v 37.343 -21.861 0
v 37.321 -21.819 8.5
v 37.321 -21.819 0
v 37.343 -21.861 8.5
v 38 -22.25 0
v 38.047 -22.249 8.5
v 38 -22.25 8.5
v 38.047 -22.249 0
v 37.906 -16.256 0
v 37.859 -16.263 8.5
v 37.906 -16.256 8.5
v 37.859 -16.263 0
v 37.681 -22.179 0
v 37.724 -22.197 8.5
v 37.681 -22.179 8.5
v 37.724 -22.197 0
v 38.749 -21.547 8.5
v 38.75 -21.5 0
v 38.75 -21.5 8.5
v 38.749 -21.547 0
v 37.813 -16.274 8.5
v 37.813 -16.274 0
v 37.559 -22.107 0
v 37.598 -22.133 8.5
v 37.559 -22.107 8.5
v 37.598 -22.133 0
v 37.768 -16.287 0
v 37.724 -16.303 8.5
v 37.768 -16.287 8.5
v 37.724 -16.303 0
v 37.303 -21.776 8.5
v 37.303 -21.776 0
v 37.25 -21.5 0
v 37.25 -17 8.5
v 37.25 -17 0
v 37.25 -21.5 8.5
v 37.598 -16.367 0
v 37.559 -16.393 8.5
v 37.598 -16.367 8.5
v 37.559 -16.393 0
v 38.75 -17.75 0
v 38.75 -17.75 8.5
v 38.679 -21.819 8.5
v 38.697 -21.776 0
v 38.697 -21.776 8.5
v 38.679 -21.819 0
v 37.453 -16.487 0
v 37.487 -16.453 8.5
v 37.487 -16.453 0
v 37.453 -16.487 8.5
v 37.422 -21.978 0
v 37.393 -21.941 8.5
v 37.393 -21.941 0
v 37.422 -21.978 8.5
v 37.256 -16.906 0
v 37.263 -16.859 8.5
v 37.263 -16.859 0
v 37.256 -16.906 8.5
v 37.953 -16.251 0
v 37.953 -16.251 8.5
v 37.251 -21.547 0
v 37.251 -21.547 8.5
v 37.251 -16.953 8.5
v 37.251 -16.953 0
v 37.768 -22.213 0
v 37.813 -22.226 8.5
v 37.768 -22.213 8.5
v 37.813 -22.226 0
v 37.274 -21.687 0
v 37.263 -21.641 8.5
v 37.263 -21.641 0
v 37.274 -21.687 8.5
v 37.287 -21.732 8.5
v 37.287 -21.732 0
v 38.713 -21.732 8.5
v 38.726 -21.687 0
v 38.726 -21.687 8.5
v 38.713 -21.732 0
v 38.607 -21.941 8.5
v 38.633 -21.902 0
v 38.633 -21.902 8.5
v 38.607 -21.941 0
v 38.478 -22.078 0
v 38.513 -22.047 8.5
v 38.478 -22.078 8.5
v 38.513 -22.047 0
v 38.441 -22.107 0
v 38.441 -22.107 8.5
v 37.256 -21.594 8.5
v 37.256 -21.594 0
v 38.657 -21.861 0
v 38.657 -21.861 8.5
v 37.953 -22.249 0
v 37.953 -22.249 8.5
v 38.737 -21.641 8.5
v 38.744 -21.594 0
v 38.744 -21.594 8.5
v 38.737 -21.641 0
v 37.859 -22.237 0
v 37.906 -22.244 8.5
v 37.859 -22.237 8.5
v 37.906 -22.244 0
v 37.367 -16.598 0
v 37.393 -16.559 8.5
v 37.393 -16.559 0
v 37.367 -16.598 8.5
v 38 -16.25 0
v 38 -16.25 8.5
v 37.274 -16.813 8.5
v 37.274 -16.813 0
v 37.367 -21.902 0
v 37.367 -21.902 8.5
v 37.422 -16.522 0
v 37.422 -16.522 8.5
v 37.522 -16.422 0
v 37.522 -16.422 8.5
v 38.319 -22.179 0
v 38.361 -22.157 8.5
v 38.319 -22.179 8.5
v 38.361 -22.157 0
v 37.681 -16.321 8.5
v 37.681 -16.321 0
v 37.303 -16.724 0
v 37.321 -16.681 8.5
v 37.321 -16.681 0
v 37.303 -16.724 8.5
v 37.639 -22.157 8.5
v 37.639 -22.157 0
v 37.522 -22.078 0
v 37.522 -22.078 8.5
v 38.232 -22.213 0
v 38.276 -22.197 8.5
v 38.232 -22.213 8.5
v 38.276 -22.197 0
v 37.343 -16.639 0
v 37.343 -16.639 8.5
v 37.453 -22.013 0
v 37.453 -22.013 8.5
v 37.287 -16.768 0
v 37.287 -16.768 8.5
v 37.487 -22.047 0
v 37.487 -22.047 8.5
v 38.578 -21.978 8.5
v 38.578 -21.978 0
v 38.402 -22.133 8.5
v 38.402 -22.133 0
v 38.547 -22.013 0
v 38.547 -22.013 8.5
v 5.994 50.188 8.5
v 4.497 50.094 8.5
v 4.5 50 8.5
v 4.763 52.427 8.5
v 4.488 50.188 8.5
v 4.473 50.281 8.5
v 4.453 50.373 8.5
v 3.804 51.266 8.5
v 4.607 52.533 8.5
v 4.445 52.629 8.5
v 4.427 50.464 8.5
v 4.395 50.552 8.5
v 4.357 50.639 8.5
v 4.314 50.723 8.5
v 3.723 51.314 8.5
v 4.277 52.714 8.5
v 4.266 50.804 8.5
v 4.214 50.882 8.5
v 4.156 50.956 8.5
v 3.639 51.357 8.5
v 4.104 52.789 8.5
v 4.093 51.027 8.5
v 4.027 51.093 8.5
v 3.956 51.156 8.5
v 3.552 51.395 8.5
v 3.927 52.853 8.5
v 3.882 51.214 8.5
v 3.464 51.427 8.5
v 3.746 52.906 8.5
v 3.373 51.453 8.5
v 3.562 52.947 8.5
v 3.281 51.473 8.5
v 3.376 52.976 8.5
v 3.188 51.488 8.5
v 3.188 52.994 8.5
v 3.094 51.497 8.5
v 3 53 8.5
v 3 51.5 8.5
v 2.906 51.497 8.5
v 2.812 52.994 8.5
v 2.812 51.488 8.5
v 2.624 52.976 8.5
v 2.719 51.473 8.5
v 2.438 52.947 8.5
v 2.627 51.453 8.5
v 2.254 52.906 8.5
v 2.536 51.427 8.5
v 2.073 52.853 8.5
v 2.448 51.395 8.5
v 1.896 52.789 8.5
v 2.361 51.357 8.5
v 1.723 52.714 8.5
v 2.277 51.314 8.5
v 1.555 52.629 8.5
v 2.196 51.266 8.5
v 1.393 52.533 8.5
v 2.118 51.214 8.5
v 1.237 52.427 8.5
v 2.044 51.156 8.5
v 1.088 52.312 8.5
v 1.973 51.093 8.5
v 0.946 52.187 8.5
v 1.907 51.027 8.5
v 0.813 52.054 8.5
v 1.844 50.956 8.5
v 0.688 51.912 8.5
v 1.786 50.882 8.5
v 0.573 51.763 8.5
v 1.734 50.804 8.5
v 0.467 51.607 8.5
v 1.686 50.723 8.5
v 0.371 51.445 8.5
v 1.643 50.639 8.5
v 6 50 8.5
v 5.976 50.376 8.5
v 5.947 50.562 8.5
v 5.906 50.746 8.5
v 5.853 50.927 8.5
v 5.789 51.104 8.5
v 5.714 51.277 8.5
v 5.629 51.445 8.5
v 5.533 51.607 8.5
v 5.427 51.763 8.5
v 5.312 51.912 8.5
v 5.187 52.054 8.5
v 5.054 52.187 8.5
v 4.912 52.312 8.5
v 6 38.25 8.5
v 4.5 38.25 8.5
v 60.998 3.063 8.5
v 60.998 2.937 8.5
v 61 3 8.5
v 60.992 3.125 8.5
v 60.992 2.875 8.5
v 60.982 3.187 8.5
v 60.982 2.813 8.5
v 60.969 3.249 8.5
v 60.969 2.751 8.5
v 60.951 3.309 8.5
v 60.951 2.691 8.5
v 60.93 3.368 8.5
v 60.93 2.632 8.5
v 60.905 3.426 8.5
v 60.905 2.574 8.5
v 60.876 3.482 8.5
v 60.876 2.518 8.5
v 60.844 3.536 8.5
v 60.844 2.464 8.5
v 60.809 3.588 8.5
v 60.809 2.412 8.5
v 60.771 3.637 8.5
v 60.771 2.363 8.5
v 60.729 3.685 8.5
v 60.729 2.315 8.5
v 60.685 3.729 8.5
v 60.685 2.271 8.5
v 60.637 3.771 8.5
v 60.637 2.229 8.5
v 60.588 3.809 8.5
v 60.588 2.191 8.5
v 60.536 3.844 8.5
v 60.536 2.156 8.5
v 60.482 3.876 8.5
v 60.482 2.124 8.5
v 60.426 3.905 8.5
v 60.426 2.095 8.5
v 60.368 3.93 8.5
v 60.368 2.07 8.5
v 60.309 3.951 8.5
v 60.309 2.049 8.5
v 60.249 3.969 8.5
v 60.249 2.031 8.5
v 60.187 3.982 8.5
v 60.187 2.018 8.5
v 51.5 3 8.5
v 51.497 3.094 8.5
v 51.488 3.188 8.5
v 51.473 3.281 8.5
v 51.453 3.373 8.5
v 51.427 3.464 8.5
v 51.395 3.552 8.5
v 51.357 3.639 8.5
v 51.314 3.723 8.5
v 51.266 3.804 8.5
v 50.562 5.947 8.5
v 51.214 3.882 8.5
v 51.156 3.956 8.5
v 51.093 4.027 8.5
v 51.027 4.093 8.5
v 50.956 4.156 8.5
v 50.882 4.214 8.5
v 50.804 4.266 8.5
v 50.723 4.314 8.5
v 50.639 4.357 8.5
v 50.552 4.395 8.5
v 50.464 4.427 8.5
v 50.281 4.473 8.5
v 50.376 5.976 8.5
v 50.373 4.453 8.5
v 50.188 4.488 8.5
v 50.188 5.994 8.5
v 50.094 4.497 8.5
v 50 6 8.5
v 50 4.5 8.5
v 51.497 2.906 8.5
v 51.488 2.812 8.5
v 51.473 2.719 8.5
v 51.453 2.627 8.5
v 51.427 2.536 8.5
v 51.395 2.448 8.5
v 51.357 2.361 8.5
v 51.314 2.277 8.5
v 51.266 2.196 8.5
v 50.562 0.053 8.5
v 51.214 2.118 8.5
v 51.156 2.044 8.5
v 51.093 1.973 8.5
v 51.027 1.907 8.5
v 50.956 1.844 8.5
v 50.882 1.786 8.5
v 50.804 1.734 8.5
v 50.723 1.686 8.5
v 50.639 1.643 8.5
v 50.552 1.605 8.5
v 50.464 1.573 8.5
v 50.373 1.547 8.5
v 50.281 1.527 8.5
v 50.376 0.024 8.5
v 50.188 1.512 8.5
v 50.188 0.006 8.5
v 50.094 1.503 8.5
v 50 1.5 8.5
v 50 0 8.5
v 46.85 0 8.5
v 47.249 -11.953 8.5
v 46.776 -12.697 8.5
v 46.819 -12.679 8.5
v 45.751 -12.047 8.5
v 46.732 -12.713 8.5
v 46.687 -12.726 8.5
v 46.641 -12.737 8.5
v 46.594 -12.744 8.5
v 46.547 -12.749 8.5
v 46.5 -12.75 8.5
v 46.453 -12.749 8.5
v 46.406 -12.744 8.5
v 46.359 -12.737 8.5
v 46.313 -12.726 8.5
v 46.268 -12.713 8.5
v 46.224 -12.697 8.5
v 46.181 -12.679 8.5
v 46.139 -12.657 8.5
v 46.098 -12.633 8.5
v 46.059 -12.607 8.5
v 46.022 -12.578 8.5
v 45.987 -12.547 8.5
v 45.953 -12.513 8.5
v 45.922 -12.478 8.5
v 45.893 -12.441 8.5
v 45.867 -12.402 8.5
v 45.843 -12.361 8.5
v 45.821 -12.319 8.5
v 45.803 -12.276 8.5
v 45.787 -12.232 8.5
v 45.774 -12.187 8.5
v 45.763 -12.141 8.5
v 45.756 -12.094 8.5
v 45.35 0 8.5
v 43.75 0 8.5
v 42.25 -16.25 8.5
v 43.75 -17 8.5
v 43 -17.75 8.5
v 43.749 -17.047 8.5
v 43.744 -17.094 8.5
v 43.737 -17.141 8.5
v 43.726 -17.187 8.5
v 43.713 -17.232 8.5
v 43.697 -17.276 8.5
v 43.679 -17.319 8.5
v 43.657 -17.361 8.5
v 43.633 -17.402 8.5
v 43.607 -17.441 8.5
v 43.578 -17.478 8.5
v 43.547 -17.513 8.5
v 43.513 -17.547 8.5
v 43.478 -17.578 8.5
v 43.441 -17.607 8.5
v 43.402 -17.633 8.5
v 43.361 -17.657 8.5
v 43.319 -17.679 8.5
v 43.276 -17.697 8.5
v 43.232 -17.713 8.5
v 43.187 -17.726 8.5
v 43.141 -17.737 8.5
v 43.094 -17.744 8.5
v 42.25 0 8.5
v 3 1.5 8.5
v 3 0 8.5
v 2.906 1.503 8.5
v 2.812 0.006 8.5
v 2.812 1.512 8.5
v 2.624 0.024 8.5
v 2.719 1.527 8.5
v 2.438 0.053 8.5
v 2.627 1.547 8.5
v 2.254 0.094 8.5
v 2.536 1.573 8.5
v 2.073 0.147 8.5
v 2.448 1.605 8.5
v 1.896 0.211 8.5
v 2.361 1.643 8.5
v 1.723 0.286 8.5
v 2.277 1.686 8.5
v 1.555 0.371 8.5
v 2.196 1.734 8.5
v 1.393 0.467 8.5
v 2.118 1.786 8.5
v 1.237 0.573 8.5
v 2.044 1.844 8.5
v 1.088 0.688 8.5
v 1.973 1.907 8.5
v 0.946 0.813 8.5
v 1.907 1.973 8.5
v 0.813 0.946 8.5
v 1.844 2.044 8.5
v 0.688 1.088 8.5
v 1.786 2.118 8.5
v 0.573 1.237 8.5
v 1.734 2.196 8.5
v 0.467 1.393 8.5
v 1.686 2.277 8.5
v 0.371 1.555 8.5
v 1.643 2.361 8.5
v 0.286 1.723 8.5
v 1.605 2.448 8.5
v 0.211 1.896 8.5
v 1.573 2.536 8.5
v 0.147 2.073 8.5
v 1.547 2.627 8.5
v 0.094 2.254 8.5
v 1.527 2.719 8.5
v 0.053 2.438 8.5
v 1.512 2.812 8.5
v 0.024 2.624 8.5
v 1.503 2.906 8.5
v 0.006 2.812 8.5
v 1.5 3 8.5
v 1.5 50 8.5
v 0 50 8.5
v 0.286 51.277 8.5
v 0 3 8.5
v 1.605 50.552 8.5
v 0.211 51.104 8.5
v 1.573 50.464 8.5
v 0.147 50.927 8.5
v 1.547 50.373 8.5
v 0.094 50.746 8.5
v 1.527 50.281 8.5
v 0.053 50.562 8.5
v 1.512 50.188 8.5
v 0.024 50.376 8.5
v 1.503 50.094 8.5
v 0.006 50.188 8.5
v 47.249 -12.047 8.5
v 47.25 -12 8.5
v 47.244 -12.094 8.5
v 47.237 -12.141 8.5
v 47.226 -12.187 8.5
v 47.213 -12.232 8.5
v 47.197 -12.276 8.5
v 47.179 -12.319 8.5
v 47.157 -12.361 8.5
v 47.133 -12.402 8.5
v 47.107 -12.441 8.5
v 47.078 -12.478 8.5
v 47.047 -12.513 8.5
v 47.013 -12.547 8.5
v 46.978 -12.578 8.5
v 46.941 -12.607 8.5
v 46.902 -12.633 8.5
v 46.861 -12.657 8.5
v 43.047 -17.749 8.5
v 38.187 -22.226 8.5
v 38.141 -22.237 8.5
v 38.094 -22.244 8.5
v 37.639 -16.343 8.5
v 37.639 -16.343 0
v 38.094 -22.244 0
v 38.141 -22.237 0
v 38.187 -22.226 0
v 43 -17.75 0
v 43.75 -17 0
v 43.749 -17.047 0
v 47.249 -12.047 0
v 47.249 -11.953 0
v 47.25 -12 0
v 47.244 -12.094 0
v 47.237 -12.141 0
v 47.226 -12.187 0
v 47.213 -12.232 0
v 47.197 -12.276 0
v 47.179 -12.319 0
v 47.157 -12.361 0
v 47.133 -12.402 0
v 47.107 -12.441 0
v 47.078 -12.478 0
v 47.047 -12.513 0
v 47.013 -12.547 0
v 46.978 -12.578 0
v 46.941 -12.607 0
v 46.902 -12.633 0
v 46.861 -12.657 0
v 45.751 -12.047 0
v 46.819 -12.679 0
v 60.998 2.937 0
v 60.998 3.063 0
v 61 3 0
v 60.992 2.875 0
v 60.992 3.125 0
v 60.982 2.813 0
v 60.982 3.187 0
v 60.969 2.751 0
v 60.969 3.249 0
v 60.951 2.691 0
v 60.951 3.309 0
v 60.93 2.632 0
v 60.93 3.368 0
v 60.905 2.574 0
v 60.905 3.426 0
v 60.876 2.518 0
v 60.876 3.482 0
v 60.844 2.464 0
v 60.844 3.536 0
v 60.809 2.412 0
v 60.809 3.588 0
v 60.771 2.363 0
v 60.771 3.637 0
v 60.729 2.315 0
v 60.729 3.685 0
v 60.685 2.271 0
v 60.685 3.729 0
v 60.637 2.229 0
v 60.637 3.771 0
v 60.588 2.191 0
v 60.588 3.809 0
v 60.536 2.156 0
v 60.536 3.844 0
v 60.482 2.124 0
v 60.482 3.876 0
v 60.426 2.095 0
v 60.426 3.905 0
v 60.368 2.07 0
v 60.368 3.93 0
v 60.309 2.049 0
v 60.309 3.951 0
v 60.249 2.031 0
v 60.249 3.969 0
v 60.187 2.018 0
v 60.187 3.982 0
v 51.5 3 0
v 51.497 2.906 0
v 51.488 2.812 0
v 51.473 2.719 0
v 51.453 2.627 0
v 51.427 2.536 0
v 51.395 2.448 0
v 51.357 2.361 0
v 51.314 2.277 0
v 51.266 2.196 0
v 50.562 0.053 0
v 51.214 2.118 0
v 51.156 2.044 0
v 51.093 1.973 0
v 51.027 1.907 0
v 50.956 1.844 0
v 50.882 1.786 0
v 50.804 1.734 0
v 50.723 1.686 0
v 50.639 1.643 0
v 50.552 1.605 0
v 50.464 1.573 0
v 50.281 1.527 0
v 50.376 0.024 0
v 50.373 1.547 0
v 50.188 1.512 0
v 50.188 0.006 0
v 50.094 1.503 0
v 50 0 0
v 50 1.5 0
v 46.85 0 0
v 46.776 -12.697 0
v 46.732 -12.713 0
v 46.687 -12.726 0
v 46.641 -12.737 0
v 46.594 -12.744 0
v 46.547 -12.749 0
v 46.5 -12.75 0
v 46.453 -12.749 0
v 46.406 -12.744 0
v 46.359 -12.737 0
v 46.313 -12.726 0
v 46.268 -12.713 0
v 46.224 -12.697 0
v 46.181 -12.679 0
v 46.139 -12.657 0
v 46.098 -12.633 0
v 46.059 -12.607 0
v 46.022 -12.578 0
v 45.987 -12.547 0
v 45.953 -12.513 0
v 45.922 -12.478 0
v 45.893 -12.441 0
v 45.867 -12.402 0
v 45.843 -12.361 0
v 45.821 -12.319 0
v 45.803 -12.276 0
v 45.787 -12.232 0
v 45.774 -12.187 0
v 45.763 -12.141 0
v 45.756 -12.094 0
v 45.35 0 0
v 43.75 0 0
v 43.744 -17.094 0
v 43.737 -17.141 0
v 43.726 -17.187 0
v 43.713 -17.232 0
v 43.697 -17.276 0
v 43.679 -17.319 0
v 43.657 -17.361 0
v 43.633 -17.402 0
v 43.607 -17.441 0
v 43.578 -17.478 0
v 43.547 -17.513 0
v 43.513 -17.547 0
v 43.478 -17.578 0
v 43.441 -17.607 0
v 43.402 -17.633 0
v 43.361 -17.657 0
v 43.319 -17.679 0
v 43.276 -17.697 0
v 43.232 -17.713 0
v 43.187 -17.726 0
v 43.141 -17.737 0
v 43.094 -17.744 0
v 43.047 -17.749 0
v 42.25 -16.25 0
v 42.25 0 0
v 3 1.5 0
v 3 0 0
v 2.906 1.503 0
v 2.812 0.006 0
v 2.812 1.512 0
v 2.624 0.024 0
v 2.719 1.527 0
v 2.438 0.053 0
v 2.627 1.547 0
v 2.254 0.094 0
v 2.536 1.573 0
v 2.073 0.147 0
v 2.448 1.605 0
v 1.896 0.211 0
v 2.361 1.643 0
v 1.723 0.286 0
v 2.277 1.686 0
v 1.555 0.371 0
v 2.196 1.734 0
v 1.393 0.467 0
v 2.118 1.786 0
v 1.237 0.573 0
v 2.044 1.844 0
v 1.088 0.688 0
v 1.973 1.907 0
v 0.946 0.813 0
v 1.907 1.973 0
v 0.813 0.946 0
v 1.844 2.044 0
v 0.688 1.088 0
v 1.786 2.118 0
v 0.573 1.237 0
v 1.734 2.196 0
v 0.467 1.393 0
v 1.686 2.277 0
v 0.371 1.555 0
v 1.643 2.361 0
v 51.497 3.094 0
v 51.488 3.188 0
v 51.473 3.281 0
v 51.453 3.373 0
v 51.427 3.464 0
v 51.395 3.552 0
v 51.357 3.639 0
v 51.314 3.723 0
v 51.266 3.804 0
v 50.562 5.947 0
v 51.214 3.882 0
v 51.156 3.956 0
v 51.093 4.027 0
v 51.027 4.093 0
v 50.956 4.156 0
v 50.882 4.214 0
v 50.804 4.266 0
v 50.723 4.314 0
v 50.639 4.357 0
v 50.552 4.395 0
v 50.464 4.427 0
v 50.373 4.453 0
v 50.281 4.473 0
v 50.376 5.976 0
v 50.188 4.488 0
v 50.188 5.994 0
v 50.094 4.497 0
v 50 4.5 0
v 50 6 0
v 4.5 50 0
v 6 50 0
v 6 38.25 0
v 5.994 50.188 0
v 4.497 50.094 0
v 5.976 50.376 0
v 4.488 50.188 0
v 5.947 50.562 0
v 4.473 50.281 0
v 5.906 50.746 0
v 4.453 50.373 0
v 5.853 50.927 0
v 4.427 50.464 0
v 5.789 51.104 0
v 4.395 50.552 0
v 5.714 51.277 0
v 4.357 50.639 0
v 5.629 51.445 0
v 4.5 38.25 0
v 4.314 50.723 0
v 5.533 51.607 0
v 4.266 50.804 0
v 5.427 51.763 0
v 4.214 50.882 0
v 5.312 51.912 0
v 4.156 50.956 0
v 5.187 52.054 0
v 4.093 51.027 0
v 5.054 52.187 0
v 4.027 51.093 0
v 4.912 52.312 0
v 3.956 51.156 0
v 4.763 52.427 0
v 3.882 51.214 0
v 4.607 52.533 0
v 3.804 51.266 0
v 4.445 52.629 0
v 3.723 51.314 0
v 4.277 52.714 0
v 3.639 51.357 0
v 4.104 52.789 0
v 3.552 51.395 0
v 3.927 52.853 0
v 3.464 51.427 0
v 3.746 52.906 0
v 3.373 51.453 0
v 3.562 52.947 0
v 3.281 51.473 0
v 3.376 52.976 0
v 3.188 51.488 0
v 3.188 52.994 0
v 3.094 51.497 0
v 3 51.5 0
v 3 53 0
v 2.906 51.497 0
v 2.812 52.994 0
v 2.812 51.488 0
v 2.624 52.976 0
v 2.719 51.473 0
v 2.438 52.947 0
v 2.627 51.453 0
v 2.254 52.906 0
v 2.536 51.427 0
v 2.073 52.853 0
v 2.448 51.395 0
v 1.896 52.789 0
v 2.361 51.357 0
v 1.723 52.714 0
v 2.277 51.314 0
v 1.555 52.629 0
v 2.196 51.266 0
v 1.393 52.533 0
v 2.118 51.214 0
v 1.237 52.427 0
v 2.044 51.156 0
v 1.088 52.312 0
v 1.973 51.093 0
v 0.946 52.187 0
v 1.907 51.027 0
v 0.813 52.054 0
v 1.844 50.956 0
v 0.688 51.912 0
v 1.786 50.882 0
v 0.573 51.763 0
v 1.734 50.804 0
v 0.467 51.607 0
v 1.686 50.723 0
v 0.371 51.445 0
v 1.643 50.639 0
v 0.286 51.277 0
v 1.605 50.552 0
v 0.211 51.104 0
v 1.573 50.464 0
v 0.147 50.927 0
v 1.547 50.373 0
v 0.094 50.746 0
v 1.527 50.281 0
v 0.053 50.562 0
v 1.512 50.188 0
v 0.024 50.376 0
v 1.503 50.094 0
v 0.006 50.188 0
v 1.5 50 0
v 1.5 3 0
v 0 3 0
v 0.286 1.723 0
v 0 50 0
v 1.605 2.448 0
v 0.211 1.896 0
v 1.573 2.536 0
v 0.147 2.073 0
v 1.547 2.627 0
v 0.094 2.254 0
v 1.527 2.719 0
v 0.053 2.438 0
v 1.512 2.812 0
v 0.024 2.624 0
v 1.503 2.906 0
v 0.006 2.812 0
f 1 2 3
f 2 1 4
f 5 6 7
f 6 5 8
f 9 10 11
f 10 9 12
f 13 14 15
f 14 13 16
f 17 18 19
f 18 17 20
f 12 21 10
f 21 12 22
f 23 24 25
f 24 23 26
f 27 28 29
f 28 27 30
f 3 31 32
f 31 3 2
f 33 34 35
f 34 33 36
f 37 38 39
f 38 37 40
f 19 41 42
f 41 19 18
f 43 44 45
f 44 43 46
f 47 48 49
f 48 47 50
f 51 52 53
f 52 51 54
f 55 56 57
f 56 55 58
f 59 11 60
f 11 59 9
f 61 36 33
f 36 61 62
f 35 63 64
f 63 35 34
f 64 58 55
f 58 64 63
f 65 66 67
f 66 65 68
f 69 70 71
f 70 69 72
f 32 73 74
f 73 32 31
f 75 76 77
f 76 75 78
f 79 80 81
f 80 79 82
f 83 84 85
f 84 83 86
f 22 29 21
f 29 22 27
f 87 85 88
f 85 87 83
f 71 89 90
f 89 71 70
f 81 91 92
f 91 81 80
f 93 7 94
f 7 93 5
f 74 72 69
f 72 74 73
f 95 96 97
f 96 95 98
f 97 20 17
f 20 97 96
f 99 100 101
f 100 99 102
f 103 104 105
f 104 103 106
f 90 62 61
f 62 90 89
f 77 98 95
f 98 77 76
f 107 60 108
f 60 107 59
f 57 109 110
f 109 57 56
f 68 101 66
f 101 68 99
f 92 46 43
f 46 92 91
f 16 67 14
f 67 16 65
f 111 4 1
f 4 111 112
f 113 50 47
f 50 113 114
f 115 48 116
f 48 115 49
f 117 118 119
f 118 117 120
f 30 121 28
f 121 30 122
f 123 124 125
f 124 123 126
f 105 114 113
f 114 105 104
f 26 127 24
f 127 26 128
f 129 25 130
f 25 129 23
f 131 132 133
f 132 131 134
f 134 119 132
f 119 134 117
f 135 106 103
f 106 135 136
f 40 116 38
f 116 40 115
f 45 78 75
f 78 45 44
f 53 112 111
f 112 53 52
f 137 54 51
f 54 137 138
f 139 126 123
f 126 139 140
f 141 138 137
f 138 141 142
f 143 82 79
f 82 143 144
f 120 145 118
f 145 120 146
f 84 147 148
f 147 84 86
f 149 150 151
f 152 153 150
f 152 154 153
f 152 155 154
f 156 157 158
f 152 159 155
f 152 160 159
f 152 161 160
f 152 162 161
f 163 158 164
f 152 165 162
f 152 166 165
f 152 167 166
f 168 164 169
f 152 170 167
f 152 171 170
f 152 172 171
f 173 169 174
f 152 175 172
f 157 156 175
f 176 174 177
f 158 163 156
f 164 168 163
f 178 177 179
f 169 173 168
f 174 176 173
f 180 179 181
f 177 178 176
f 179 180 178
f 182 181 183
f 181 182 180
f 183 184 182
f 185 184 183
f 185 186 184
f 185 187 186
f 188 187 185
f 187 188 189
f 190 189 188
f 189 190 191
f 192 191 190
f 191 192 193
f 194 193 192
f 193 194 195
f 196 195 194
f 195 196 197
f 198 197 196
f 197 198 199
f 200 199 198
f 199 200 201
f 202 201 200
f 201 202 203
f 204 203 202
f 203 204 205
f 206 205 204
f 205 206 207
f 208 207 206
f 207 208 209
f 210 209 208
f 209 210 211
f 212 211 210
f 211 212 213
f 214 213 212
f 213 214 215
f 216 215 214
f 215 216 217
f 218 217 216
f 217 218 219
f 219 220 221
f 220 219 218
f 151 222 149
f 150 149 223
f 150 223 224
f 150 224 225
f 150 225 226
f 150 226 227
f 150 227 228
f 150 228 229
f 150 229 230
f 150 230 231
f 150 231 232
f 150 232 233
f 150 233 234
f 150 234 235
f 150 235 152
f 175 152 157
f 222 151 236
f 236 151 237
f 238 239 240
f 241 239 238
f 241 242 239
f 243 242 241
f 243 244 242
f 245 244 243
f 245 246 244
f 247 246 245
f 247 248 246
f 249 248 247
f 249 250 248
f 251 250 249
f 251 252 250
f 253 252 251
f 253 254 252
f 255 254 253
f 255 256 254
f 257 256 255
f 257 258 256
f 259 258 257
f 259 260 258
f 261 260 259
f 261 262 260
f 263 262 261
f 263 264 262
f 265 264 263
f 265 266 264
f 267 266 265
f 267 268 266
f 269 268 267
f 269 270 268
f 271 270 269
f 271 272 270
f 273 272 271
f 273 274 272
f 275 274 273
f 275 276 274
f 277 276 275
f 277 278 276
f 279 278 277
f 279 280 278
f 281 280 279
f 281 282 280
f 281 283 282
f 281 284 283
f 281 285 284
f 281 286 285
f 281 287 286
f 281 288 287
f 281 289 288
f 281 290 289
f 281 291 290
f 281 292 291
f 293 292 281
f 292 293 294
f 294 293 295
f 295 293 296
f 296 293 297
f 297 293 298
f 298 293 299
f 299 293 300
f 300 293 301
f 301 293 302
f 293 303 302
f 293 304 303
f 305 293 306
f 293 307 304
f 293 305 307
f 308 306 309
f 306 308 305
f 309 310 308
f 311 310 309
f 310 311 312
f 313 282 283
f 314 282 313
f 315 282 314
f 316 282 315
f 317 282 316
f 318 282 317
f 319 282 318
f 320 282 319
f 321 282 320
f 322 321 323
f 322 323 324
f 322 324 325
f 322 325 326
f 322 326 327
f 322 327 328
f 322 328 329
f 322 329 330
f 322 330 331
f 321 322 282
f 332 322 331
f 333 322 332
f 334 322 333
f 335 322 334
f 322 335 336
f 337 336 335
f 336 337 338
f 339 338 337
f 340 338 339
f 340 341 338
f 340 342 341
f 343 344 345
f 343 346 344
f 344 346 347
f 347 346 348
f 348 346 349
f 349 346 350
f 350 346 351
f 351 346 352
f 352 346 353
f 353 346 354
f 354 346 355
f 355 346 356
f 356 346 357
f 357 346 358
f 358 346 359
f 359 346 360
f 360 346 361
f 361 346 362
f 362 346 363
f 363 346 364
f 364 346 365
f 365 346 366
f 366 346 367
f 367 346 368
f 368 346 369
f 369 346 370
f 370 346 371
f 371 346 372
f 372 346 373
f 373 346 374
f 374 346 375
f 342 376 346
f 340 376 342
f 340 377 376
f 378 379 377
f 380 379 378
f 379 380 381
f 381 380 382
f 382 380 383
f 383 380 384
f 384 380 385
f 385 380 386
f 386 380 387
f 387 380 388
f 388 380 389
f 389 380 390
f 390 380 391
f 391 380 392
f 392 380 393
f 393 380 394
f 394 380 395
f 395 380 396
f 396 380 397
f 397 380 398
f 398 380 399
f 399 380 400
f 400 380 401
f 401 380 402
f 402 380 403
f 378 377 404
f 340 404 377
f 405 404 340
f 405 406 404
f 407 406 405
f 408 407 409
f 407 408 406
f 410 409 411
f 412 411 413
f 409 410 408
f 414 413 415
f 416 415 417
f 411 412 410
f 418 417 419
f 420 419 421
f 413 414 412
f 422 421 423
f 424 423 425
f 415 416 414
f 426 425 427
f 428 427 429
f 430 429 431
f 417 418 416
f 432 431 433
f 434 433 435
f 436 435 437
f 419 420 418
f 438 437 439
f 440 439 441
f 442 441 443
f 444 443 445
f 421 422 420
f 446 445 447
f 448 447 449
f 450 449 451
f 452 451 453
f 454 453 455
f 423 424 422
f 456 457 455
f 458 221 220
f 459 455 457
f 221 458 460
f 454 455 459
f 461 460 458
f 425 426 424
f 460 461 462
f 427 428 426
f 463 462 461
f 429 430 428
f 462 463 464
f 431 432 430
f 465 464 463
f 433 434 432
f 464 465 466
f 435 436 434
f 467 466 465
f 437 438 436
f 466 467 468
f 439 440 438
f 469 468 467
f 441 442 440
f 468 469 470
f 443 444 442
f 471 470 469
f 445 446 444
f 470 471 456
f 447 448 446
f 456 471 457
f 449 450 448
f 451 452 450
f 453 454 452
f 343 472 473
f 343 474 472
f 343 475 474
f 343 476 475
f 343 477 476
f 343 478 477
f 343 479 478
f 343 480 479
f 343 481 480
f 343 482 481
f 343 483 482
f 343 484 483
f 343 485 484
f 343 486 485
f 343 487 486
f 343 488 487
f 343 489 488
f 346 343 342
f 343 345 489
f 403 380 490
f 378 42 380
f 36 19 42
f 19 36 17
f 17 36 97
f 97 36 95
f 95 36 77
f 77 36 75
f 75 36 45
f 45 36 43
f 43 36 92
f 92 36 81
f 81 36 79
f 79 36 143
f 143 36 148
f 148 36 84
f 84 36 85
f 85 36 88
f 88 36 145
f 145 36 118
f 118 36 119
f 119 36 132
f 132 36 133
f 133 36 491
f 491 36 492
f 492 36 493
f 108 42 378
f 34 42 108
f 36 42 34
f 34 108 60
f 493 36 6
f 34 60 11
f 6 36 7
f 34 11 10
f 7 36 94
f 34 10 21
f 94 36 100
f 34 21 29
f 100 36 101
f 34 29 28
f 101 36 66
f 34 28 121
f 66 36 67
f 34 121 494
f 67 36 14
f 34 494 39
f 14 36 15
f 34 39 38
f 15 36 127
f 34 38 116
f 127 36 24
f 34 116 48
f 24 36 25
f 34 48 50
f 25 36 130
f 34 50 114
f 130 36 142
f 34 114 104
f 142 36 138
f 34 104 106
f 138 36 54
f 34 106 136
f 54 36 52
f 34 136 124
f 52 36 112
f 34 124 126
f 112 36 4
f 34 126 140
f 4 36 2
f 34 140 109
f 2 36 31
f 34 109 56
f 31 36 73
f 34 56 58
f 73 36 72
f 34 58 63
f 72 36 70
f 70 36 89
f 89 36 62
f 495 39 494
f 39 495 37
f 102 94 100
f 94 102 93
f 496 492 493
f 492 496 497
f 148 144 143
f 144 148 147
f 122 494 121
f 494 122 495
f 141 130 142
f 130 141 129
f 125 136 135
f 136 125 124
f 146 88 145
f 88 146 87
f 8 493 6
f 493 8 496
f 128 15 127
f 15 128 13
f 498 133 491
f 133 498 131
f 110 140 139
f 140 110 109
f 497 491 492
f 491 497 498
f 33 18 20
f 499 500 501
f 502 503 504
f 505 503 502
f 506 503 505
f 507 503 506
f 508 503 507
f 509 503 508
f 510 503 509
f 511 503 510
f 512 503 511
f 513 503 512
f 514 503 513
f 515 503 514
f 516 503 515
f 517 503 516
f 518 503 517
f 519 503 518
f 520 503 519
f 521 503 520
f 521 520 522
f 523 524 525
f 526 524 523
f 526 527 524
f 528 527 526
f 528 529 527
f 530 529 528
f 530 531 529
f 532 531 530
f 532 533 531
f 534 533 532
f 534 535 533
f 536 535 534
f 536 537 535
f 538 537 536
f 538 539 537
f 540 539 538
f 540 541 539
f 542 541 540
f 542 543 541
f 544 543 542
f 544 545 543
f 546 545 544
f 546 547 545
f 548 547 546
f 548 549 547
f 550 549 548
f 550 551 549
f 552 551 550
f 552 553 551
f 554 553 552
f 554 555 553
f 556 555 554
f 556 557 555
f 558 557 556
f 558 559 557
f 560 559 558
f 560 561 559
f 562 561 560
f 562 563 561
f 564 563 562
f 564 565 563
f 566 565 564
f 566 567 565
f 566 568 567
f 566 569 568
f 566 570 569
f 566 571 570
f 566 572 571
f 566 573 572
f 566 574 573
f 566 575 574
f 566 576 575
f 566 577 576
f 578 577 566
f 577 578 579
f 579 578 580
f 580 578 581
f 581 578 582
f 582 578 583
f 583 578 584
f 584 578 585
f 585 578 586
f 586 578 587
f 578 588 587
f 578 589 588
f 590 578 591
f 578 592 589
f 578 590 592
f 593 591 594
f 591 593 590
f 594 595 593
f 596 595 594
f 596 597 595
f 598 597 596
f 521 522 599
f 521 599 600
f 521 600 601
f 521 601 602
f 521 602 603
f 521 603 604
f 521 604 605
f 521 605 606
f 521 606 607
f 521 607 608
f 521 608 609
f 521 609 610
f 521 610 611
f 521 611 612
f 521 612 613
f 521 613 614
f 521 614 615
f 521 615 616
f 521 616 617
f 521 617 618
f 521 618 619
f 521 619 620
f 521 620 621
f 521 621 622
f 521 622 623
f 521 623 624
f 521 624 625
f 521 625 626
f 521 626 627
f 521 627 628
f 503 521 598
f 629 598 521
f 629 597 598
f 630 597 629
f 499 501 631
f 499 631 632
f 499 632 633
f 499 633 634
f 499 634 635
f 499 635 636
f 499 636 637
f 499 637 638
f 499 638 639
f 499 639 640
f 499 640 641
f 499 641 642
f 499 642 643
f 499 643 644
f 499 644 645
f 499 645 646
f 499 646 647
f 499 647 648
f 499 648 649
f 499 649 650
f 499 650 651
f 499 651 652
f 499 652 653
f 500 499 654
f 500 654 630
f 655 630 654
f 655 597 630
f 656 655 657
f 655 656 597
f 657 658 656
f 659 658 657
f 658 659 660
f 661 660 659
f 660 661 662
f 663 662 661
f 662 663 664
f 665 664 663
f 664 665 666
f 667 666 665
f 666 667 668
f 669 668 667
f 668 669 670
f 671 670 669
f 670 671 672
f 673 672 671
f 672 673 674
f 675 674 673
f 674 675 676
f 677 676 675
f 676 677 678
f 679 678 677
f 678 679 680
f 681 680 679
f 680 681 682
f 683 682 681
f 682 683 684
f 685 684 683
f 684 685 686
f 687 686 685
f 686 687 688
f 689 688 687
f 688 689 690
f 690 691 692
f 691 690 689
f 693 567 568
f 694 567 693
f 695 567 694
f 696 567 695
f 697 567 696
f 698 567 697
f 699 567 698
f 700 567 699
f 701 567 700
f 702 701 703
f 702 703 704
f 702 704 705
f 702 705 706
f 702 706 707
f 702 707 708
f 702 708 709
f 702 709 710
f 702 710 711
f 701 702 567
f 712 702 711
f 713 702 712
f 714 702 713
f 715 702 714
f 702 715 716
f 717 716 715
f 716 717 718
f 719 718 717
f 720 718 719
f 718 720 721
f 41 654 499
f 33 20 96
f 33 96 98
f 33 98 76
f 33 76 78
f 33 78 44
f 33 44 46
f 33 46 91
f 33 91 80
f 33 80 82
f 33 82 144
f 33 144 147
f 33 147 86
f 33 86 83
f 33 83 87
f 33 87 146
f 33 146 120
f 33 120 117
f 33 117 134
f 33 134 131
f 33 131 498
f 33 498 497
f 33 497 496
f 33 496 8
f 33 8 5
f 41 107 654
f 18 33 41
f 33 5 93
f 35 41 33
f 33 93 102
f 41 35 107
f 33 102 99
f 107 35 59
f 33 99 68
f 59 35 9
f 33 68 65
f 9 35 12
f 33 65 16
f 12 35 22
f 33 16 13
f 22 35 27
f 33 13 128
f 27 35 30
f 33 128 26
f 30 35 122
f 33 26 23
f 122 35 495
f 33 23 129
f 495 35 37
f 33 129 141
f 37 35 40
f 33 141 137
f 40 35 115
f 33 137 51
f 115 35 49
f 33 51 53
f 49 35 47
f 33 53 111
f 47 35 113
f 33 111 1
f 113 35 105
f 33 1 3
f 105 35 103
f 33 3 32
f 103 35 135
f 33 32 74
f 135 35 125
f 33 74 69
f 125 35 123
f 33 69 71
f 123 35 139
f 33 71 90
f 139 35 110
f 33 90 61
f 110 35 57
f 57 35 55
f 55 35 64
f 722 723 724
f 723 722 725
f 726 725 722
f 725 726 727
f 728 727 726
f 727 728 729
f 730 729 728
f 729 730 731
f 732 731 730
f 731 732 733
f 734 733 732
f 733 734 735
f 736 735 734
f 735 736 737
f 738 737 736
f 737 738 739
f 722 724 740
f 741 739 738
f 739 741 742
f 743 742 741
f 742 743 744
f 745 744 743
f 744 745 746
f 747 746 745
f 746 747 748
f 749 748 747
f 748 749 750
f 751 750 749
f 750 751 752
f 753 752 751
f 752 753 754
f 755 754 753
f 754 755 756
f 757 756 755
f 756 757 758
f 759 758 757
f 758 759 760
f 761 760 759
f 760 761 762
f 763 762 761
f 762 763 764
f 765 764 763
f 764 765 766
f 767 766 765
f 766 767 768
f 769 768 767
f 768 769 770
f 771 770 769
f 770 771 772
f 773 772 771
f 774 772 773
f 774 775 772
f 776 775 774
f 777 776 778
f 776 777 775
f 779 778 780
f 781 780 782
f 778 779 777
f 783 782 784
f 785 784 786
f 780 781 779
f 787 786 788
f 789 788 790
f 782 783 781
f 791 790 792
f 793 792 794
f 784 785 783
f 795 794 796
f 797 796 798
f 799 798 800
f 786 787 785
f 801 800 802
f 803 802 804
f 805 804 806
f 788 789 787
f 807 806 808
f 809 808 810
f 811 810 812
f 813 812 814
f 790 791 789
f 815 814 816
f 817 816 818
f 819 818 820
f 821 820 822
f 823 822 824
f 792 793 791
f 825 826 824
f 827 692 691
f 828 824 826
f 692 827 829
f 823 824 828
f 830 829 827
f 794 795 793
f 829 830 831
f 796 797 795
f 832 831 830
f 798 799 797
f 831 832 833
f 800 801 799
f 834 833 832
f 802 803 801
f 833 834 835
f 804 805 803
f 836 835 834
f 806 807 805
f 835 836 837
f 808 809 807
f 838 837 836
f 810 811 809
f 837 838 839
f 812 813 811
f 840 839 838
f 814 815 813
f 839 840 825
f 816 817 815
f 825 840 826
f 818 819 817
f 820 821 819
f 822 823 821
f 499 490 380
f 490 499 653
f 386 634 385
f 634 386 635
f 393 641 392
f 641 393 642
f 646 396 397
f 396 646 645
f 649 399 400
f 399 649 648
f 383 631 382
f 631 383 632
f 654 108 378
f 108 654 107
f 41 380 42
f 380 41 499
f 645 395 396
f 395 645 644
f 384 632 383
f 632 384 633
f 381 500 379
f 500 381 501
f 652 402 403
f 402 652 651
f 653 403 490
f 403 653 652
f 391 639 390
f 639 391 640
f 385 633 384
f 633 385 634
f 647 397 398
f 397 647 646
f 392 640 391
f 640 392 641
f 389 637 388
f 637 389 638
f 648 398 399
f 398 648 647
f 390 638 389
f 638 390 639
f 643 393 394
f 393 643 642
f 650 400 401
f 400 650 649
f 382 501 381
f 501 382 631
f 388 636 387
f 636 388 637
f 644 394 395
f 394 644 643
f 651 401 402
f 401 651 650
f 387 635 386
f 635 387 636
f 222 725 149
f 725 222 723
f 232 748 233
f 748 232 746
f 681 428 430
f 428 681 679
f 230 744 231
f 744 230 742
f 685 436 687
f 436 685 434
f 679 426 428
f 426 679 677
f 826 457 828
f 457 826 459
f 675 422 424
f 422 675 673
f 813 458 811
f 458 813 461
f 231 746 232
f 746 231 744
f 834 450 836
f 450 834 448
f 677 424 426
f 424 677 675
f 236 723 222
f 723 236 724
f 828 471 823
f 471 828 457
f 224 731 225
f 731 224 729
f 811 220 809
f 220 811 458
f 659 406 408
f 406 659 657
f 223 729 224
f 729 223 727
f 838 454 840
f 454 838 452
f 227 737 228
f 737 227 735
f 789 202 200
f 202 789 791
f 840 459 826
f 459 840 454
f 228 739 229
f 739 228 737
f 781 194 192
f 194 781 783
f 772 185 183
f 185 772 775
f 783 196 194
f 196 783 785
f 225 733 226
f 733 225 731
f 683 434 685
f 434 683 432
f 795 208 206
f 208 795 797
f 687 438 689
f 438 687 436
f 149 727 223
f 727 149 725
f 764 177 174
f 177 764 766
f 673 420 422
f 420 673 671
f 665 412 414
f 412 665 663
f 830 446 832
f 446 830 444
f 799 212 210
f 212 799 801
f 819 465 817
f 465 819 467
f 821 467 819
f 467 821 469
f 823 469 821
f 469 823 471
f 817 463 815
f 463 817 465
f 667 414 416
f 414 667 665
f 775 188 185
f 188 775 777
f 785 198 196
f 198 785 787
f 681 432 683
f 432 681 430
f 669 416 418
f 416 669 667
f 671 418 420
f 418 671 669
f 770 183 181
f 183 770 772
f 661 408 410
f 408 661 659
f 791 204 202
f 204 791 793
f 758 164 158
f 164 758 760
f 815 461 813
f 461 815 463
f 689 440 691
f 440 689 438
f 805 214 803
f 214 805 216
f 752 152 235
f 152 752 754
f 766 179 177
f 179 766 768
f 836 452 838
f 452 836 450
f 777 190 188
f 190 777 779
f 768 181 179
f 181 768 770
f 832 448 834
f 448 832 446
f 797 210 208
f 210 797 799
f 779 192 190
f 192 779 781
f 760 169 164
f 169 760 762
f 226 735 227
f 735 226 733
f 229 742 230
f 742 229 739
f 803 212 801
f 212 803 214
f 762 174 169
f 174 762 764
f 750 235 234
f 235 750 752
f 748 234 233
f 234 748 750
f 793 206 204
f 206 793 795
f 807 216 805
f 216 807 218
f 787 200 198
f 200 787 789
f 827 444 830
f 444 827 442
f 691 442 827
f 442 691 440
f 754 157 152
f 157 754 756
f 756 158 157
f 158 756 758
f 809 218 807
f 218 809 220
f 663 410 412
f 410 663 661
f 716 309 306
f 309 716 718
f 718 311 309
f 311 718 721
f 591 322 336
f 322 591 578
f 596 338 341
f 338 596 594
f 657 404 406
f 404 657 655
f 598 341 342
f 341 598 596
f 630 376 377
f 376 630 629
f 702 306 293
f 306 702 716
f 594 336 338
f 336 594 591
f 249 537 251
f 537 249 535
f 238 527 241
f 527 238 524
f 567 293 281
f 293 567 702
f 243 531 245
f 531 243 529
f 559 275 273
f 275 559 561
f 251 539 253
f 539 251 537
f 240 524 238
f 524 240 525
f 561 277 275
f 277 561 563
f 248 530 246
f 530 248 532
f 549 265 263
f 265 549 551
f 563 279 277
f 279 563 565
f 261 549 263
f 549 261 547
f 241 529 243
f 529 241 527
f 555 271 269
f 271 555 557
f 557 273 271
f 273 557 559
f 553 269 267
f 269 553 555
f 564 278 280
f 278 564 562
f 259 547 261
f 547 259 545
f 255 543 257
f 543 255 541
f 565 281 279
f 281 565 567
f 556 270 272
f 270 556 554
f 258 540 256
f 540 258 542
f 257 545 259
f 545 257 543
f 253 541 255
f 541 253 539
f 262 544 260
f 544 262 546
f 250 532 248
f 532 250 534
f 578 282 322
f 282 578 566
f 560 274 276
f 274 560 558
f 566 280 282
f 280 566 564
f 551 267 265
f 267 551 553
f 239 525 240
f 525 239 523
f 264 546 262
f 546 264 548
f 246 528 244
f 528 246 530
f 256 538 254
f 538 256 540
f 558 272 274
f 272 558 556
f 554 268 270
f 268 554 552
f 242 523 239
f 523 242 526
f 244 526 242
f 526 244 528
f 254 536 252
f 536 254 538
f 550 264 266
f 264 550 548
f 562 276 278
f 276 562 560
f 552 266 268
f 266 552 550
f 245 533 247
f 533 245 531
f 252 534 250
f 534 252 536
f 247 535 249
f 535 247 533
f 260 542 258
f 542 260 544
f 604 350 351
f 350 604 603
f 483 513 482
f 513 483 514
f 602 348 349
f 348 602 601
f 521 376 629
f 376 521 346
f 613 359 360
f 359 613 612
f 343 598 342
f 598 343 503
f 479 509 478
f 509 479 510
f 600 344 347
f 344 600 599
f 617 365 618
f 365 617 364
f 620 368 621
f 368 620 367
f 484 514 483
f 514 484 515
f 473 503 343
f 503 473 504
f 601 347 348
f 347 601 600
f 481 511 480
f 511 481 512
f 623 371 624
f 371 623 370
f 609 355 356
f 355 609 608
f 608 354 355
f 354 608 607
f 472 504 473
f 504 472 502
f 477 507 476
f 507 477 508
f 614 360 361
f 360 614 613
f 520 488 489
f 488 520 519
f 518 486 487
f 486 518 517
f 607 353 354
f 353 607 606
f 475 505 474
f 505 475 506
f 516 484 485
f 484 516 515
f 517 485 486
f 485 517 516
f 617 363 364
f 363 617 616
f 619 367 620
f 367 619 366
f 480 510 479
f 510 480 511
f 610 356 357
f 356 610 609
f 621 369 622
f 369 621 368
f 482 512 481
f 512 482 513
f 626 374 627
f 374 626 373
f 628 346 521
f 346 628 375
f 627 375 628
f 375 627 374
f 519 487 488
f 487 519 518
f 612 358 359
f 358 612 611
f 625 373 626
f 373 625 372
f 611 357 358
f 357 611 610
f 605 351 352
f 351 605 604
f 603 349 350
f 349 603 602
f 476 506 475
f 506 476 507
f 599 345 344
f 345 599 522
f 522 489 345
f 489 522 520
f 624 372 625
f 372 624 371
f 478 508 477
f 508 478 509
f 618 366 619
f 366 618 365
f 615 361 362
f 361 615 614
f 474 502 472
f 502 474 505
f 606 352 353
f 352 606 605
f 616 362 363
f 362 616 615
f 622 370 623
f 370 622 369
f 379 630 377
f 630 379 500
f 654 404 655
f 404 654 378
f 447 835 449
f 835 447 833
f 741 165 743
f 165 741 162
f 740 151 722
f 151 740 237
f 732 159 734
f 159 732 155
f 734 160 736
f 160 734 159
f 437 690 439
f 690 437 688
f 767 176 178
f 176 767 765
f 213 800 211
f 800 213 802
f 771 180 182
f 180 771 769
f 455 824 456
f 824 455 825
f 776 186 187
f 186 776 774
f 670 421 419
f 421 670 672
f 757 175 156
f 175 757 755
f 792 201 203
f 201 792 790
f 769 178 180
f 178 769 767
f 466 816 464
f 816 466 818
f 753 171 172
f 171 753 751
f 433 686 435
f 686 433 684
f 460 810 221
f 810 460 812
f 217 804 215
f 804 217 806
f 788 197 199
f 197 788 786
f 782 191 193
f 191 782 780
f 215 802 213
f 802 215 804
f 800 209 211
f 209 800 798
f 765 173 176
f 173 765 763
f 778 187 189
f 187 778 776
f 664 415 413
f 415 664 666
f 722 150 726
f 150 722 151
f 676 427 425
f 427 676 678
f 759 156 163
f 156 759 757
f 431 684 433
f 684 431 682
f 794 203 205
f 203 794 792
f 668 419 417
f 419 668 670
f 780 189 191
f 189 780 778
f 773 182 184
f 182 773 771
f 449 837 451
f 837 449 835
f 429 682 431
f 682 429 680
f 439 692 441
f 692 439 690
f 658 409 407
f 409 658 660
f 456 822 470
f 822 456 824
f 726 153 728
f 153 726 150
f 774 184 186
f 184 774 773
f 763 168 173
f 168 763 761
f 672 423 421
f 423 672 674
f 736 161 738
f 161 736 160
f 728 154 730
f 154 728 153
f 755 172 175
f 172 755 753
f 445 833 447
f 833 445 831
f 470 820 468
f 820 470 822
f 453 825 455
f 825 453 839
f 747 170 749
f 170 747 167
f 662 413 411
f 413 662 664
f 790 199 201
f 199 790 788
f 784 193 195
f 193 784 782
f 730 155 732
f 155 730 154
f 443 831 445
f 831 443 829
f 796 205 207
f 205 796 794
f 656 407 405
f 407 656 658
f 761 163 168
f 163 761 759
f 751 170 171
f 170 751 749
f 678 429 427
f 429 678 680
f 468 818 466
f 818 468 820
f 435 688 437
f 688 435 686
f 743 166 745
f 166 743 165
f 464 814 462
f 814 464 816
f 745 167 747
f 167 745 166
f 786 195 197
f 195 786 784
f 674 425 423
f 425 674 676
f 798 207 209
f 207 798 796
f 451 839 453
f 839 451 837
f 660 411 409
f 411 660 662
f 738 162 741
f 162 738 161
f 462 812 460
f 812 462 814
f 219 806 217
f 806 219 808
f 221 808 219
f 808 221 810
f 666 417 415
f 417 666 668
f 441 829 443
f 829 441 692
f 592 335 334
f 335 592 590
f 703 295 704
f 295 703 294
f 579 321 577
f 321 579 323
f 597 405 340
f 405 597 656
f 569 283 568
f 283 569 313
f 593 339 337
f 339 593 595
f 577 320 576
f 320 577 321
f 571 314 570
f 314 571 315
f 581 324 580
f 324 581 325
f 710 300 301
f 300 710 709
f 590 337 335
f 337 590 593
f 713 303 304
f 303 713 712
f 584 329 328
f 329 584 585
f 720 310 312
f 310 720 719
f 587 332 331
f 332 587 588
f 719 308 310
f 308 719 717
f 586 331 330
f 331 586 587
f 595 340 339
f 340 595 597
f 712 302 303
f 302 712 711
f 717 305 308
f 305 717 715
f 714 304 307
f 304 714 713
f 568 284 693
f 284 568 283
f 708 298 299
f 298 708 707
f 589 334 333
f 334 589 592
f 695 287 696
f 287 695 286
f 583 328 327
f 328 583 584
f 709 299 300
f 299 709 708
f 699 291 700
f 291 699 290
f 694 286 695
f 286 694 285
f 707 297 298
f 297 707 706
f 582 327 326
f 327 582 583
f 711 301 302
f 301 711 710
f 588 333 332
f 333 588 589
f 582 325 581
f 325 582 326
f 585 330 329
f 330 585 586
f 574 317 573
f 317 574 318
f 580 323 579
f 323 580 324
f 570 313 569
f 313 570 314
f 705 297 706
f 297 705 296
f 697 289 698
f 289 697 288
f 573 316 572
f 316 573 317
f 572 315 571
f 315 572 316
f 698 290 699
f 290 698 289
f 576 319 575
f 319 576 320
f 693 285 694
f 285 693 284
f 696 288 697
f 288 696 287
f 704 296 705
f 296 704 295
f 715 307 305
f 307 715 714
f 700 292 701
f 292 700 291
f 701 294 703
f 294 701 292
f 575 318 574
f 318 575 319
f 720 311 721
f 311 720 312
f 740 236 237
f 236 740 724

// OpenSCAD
/*
    Filament Mounting Clip For Cocoon Create
    By Brian Khuu 2019
*/
$fn=100;

/*
# Filament Mount Z
[<====y====>]
        [ ^ ]
        [ | ]
        [ x ]
        [ | ]
        [ V ]
*/
filament_mount_y_length=6;
filament_mount_x_length=5;
filament_mount_y_offset=20;
filament_mount_x_offset=40;
filament_mount_width=8.5;
filament_mount_thickness=1.5;

/*
# Filament Mount Z
[<====y====>]
[ ^ ]
[ | ]
[ x ]
[ | ]
[ V ]
*/
printer_frame_tol=1;
printer_frame_clip_thickness=1.5;
printer_frame_y_lenght = 50;
printer_frame_x_lenght = 50;
metal_sheet_thickness=2+printer_frame_tol;

module sheet_metal(width)
{
    translate([0,0,-1])
    union()
    {
        hull()
        {
            translate([0,0,0])
                cylinder(r=metal_sheet_thickness/2, h=width+2);
            translate([0,printer_frame_y_lenght-metal_sheet_thickness,0])
                cylinder(r=metal_sheet_thickness/2, h=width+2);
        }
        hull()
        {
            translate([0,0,0])
                cylinder(r=metal_sheet_thickness/2, h=width+2);
            translate([printer_frame_x_lenght-metal_sheet_thickness,0,0])
                cylinder(r=metal_sheet_thickness/2, h=width+2);
        }
        cube([(printer_frame_x_lenght-metal_sheet_thickness),(printer_frame_y_lenght-metal_sheet_thickness)*3/4,width+2]);
    }
}

module sheet_metal_clip(width, thickness)
{
    diameter=metal_sheet_thickness+thickness*2;
    translate([thickness*2,thickness*2,0])
    difference()
    {
        union()
        {
            /* Clip */
            hull()
            {
                translate([0,0,0])
                    cylinder(r=diameter/2, h=width);
                translate([0,printer_frame_y_lenght-diameter/2,0])
                    cylinder(r=diameter/2, h=width);
            }
            hull()
            {
                translate([0,0,0])
                    cylinder(r=diameter/2, h=width);
                translate([printer_frame_x_lenght-diameter/2,0,0])
                    cylinder(r=diameter/2, h=width);
            }
            
            /* Tab */
            hull()
            {
                translate([printer_frame_x_lenght-diameter/2,0,0])
                    cylinder(r=diameter/2, h=width);
                translate([printer_frame_x_lenght-diameter/2+10,0,0])
                    cylinder(r=1, h=width);
            }
            
            /* Cable Clip*/
            hull()
            {
                translate([filament_mount_x_offset+filament_mount_thickness+2,-filament_mount_y_offset*3/4,0])
                    cylinder(r=filament_mount_thickness/2, h=width);
                translate([filament_mount_x_offset+filament_mount_thickness+1.5,0,0])
                    cylinder(r=filament_mount_thickness/2, h=width);
            }
            
            /* Mount Offset*/
            hull()
            {
                translate([filament_mount_x_offset,-filament_mount_y_offset,0])
                    cylinder(r=filament_mount_thickness/2, h=width);
                translate([filament_mount_x_offset,0,0])
                    cylinder(r=filament_mount_thickness/2, h=width);
            }
            
            /* Mount */
            translate([filament_mount_x_offset-filament_mount_x_length,-filament_mount_y_offset,0])
            union()
            {
                hull()
                {
                    translate([0,0,0])
                        cylinder(r=filament_mount_thickness/2, h=width);
                    translate([0,-filament_mount_y_length+filament_mount_thickness,0])
                        cylinder(r=filament_mount_thickness/2, h=width);
                }
                hull()
                {
                    translate([0,0,0])
                        cylinder(r=filament_mount_thickness/2, h=width);
                    translate([filament_mount_x_length,0,0])
                        cylinder(r=filament_mount_thickness/2, h=width);
                }
            }
            
            
        }
        sheet_metal(width);
    }
}

sheet_metal_clip(filament_mount_width,printer_frame_clip_thickness);
